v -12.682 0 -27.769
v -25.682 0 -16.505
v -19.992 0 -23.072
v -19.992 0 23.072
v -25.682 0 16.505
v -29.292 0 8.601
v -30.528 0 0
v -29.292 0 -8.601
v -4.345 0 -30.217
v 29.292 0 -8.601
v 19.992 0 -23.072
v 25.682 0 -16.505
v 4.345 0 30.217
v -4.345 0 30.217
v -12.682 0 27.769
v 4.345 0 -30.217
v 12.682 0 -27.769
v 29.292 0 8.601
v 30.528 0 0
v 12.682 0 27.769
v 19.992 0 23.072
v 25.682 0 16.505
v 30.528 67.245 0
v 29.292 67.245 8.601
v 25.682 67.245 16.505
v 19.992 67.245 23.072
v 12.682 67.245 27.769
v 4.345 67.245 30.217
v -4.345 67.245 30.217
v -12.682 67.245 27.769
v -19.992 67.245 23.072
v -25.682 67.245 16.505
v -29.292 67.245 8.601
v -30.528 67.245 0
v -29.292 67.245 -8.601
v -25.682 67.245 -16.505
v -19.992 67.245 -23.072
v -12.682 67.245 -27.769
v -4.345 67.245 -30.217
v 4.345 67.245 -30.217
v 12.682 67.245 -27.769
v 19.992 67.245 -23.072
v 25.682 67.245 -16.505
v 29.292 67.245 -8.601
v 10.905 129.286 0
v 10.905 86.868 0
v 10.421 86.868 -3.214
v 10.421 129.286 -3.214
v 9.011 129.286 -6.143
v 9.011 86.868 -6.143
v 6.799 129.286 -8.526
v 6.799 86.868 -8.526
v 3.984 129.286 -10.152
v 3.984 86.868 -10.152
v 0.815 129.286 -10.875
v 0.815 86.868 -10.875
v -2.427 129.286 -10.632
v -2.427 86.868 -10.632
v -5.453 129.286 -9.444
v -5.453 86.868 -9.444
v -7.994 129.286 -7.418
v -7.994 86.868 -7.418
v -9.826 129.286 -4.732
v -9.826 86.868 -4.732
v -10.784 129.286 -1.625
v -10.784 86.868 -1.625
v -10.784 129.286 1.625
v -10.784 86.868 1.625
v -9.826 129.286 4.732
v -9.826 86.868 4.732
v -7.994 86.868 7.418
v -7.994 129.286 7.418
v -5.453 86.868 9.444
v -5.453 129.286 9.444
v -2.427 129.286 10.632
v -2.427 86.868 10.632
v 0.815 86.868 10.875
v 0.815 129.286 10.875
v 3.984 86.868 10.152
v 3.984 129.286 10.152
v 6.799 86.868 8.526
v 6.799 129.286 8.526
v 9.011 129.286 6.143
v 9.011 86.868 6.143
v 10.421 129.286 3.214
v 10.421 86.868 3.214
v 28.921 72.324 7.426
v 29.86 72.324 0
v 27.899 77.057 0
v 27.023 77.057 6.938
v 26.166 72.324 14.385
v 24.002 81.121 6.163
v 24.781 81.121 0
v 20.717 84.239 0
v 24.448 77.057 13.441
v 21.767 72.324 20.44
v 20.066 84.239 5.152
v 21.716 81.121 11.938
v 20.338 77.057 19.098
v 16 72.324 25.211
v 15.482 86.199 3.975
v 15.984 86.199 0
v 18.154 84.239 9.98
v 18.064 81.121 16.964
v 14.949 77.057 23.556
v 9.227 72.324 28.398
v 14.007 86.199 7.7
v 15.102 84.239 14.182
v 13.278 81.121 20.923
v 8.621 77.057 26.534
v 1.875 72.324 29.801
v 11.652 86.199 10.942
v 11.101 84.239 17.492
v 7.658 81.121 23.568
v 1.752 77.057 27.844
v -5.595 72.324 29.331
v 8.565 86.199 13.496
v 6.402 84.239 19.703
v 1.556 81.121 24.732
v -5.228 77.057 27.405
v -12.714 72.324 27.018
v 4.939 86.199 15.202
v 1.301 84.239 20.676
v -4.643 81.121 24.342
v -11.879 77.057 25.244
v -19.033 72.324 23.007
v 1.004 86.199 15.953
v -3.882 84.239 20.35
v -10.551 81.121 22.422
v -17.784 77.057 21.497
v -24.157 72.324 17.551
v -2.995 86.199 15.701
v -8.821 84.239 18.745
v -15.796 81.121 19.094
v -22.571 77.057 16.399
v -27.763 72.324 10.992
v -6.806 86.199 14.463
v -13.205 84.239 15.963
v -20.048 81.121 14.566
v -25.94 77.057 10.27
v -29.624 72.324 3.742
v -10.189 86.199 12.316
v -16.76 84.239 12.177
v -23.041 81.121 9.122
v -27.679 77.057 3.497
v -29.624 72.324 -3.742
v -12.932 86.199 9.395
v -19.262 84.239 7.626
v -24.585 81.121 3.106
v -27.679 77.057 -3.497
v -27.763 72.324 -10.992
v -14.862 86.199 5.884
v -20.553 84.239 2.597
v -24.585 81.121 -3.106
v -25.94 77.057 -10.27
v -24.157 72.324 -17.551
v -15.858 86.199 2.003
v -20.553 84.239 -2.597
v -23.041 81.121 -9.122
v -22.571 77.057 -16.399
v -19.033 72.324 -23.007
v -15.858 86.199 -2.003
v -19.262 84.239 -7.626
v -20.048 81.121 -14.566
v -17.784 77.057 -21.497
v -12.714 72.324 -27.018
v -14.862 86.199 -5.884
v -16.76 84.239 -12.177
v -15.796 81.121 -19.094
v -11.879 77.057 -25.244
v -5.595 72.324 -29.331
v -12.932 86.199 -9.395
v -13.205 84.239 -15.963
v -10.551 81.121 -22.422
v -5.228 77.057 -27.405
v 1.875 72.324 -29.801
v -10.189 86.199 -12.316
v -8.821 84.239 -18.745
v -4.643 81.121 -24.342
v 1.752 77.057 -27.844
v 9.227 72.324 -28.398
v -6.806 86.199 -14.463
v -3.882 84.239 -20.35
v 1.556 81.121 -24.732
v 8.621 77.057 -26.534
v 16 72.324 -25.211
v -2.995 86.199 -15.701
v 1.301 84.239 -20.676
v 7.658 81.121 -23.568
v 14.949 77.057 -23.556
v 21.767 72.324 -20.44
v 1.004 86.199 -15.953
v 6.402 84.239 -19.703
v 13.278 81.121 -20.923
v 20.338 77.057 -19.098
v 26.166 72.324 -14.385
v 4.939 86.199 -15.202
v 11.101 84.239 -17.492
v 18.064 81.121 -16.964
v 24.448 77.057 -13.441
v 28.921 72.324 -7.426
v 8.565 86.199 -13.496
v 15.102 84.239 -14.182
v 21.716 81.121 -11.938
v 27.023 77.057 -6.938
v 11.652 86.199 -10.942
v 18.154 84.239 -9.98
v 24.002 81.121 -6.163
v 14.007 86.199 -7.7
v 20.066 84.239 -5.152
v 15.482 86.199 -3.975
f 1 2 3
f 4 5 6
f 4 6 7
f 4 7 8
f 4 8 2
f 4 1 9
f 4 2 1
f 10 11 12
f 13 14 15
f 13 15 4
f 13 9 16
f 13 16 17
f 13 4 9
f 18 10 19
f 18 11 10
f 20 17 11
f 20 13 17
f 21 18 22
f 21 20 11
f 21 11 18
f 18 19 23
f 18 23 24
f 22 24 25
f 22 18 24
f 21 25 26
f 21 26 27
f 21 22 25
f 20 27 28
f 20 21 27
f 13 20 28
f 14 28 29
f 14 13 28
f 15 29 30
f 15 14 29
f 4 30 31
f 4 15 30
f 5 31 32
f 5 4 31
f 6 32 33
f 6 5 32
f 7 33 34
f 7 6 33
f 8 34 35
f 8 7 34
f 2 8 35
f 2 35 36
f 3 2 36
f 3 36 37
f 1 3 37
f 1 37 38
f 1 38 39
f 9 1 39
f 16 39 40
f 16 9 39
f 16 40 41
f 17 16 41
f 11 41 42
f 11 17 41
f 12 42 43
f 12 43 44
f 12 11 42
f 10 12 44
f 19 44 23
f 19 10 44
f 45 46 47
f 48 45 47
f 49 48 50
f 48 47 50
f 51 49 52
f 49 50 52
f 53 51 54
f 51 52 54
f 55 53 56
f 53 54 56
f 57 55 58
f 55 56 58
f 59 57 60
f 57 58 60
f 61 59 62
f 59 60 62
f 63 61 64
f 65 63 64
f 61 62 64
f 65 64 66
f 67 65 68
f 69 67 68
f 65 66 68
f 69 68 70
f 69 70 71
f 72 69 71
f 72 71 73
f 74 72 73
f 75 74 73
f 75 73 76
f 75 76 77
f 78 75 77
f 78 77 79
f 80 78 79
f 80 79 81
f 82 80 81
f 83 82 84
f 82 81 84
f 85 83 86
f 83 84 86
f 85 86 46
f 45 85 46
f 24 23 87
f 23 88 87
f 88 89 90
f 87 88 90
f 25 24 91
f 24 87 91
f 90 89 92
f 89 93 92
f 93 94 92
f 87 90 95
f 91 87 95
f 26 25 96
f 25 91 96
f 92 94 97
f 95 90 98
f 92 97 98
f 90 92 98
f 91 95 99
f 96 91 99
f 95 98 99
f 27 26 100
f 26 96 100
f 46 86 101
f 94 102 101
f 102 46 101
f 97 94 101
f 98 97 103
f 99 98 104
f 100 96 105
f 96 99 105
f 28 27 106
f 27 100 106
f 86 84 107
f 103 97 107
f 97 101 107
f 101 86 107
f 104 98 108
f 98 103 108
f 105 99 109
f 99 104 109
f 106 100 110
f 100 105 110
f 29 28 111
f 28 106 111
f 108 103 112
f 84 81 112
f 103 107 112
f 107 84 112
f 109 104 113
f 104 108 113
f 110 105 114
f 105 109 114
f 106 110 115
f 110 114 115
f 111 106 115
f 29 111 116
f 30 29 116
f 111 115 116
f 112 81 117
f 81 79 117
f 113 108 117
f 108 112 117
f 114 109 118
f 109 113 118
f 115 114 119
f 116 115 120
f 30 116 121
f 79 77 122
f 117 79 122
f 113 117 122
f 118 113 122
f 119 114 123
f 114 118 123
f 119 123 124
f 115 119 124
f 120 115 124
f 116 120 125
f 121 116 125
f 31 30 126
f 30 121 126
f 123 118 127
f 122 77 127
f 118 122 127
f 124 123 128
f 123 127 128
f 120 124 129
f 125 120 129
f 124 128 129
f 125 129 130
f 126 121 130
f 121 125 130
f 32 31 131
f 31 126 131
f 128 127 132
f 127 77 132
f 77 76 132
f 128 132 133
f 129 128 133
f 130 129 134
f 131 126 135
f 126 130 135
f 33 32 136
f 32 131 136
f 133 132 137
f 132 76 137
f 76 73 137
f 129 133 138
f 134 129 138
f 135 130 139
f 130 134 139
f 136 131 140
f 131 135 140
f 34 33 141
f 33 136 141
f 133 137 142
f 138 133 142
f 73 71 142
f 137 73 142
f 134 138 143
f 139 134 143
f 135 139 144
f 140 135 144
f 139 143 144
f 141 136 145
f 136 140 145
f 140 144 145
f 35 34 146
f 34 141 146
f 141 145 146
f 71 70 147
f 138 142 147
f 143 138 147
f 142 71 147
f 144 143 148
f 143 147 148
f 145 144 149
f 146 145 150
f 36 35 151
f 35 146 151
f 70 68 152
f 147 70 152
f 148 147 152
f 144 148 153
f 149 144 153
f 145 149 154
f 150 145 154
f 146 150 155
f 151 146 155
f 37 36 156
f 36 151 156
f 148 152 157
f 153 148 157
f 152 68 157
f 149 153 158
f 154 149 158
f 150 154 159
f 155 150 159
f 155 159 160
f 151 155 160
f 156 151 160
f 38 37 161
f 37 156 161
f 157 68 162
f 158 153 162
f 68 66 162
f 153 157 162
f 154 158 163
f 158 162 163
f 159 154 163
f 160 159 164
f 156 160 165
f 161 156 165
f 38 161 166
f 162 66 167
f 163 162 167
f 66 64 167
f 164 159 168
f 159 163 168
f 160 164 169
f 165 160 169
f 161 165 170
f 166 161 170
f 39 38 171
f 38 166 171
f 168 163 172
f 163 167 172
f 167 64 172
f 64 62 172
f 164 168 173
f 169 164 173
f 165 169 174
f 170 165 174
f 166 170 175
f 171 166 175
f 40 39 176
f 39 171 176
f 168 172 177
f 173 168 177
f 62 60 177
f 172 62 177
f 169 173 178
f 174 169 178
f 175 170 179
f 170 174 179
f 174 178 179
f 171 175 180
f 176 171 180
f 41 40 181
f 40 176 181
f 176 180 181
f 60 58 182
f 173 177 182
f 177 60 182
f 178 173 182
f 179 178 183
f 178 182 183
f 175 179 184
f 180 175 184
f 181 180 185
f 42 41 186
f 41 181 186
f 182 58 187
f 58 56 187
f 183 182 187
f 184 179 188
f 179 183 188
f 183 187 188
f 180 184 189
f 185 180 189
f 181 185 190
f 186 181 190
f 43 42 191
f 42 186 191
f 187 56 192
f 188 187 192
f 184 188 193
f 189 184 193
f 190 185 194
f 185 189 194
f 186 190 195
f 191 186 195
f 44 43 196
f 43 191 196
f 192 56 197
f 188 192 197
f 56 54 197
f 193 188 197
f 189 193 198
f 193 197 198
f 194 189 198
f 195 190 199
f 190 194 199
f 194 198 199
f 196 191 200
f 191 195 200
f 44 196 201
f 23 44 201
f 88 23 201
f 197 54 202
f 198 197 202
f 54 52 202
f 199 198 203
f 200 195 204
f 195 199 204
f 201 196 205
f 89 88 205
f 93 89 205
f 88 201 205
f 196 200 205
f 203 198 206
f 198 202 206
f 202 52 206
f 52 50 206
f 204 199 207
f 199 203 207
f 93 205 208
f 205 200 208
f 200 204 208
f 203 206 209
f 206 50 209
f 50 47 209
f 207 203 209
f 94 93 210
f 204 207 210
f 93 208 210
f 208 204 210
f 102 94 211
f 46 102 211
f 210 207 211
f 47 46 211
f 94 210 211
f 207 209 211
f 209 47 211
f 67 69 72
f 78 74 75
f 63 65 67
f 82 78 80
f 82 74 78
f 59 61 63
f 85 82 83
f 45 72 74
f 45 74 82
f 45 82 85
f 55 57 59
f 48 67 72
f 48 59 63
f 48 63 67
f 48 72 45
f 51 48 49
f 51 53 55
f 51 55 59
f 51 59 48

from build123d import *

# Parameters (mm, degrees)
F0_R      = 30.528215
F1_DEPTH  = 86.868
F2_R      = 19.622728
F1_FACE_R = 10.905488
F3_DEPTH  = 42.418


with BuildPart() as f1:
    # F0 (on Front) → F1 (new body)
    with BuildSketch(Plane.XZ):
        Circle(F0_R)
    extrude(amount=-F1_DEPTH)

    # F2
    f2_edges = [f1.edges().sort_by_distance(p)[0] for p in [
        (-30.528215, 86.868, 0),
    ]]
    fillet(f2_edges, radius=F2_R)

    # F1_face (on face) → F3 (join)
    with BuildSketch(Plane(origin=(0, 86.868, 0), x_dir=(1, 0, 0), z_dir=(0, 1, 0))):
        Circle(F1_FACE_R)
    extrude(amount=F3_DEPTH)


solid = f1.part
